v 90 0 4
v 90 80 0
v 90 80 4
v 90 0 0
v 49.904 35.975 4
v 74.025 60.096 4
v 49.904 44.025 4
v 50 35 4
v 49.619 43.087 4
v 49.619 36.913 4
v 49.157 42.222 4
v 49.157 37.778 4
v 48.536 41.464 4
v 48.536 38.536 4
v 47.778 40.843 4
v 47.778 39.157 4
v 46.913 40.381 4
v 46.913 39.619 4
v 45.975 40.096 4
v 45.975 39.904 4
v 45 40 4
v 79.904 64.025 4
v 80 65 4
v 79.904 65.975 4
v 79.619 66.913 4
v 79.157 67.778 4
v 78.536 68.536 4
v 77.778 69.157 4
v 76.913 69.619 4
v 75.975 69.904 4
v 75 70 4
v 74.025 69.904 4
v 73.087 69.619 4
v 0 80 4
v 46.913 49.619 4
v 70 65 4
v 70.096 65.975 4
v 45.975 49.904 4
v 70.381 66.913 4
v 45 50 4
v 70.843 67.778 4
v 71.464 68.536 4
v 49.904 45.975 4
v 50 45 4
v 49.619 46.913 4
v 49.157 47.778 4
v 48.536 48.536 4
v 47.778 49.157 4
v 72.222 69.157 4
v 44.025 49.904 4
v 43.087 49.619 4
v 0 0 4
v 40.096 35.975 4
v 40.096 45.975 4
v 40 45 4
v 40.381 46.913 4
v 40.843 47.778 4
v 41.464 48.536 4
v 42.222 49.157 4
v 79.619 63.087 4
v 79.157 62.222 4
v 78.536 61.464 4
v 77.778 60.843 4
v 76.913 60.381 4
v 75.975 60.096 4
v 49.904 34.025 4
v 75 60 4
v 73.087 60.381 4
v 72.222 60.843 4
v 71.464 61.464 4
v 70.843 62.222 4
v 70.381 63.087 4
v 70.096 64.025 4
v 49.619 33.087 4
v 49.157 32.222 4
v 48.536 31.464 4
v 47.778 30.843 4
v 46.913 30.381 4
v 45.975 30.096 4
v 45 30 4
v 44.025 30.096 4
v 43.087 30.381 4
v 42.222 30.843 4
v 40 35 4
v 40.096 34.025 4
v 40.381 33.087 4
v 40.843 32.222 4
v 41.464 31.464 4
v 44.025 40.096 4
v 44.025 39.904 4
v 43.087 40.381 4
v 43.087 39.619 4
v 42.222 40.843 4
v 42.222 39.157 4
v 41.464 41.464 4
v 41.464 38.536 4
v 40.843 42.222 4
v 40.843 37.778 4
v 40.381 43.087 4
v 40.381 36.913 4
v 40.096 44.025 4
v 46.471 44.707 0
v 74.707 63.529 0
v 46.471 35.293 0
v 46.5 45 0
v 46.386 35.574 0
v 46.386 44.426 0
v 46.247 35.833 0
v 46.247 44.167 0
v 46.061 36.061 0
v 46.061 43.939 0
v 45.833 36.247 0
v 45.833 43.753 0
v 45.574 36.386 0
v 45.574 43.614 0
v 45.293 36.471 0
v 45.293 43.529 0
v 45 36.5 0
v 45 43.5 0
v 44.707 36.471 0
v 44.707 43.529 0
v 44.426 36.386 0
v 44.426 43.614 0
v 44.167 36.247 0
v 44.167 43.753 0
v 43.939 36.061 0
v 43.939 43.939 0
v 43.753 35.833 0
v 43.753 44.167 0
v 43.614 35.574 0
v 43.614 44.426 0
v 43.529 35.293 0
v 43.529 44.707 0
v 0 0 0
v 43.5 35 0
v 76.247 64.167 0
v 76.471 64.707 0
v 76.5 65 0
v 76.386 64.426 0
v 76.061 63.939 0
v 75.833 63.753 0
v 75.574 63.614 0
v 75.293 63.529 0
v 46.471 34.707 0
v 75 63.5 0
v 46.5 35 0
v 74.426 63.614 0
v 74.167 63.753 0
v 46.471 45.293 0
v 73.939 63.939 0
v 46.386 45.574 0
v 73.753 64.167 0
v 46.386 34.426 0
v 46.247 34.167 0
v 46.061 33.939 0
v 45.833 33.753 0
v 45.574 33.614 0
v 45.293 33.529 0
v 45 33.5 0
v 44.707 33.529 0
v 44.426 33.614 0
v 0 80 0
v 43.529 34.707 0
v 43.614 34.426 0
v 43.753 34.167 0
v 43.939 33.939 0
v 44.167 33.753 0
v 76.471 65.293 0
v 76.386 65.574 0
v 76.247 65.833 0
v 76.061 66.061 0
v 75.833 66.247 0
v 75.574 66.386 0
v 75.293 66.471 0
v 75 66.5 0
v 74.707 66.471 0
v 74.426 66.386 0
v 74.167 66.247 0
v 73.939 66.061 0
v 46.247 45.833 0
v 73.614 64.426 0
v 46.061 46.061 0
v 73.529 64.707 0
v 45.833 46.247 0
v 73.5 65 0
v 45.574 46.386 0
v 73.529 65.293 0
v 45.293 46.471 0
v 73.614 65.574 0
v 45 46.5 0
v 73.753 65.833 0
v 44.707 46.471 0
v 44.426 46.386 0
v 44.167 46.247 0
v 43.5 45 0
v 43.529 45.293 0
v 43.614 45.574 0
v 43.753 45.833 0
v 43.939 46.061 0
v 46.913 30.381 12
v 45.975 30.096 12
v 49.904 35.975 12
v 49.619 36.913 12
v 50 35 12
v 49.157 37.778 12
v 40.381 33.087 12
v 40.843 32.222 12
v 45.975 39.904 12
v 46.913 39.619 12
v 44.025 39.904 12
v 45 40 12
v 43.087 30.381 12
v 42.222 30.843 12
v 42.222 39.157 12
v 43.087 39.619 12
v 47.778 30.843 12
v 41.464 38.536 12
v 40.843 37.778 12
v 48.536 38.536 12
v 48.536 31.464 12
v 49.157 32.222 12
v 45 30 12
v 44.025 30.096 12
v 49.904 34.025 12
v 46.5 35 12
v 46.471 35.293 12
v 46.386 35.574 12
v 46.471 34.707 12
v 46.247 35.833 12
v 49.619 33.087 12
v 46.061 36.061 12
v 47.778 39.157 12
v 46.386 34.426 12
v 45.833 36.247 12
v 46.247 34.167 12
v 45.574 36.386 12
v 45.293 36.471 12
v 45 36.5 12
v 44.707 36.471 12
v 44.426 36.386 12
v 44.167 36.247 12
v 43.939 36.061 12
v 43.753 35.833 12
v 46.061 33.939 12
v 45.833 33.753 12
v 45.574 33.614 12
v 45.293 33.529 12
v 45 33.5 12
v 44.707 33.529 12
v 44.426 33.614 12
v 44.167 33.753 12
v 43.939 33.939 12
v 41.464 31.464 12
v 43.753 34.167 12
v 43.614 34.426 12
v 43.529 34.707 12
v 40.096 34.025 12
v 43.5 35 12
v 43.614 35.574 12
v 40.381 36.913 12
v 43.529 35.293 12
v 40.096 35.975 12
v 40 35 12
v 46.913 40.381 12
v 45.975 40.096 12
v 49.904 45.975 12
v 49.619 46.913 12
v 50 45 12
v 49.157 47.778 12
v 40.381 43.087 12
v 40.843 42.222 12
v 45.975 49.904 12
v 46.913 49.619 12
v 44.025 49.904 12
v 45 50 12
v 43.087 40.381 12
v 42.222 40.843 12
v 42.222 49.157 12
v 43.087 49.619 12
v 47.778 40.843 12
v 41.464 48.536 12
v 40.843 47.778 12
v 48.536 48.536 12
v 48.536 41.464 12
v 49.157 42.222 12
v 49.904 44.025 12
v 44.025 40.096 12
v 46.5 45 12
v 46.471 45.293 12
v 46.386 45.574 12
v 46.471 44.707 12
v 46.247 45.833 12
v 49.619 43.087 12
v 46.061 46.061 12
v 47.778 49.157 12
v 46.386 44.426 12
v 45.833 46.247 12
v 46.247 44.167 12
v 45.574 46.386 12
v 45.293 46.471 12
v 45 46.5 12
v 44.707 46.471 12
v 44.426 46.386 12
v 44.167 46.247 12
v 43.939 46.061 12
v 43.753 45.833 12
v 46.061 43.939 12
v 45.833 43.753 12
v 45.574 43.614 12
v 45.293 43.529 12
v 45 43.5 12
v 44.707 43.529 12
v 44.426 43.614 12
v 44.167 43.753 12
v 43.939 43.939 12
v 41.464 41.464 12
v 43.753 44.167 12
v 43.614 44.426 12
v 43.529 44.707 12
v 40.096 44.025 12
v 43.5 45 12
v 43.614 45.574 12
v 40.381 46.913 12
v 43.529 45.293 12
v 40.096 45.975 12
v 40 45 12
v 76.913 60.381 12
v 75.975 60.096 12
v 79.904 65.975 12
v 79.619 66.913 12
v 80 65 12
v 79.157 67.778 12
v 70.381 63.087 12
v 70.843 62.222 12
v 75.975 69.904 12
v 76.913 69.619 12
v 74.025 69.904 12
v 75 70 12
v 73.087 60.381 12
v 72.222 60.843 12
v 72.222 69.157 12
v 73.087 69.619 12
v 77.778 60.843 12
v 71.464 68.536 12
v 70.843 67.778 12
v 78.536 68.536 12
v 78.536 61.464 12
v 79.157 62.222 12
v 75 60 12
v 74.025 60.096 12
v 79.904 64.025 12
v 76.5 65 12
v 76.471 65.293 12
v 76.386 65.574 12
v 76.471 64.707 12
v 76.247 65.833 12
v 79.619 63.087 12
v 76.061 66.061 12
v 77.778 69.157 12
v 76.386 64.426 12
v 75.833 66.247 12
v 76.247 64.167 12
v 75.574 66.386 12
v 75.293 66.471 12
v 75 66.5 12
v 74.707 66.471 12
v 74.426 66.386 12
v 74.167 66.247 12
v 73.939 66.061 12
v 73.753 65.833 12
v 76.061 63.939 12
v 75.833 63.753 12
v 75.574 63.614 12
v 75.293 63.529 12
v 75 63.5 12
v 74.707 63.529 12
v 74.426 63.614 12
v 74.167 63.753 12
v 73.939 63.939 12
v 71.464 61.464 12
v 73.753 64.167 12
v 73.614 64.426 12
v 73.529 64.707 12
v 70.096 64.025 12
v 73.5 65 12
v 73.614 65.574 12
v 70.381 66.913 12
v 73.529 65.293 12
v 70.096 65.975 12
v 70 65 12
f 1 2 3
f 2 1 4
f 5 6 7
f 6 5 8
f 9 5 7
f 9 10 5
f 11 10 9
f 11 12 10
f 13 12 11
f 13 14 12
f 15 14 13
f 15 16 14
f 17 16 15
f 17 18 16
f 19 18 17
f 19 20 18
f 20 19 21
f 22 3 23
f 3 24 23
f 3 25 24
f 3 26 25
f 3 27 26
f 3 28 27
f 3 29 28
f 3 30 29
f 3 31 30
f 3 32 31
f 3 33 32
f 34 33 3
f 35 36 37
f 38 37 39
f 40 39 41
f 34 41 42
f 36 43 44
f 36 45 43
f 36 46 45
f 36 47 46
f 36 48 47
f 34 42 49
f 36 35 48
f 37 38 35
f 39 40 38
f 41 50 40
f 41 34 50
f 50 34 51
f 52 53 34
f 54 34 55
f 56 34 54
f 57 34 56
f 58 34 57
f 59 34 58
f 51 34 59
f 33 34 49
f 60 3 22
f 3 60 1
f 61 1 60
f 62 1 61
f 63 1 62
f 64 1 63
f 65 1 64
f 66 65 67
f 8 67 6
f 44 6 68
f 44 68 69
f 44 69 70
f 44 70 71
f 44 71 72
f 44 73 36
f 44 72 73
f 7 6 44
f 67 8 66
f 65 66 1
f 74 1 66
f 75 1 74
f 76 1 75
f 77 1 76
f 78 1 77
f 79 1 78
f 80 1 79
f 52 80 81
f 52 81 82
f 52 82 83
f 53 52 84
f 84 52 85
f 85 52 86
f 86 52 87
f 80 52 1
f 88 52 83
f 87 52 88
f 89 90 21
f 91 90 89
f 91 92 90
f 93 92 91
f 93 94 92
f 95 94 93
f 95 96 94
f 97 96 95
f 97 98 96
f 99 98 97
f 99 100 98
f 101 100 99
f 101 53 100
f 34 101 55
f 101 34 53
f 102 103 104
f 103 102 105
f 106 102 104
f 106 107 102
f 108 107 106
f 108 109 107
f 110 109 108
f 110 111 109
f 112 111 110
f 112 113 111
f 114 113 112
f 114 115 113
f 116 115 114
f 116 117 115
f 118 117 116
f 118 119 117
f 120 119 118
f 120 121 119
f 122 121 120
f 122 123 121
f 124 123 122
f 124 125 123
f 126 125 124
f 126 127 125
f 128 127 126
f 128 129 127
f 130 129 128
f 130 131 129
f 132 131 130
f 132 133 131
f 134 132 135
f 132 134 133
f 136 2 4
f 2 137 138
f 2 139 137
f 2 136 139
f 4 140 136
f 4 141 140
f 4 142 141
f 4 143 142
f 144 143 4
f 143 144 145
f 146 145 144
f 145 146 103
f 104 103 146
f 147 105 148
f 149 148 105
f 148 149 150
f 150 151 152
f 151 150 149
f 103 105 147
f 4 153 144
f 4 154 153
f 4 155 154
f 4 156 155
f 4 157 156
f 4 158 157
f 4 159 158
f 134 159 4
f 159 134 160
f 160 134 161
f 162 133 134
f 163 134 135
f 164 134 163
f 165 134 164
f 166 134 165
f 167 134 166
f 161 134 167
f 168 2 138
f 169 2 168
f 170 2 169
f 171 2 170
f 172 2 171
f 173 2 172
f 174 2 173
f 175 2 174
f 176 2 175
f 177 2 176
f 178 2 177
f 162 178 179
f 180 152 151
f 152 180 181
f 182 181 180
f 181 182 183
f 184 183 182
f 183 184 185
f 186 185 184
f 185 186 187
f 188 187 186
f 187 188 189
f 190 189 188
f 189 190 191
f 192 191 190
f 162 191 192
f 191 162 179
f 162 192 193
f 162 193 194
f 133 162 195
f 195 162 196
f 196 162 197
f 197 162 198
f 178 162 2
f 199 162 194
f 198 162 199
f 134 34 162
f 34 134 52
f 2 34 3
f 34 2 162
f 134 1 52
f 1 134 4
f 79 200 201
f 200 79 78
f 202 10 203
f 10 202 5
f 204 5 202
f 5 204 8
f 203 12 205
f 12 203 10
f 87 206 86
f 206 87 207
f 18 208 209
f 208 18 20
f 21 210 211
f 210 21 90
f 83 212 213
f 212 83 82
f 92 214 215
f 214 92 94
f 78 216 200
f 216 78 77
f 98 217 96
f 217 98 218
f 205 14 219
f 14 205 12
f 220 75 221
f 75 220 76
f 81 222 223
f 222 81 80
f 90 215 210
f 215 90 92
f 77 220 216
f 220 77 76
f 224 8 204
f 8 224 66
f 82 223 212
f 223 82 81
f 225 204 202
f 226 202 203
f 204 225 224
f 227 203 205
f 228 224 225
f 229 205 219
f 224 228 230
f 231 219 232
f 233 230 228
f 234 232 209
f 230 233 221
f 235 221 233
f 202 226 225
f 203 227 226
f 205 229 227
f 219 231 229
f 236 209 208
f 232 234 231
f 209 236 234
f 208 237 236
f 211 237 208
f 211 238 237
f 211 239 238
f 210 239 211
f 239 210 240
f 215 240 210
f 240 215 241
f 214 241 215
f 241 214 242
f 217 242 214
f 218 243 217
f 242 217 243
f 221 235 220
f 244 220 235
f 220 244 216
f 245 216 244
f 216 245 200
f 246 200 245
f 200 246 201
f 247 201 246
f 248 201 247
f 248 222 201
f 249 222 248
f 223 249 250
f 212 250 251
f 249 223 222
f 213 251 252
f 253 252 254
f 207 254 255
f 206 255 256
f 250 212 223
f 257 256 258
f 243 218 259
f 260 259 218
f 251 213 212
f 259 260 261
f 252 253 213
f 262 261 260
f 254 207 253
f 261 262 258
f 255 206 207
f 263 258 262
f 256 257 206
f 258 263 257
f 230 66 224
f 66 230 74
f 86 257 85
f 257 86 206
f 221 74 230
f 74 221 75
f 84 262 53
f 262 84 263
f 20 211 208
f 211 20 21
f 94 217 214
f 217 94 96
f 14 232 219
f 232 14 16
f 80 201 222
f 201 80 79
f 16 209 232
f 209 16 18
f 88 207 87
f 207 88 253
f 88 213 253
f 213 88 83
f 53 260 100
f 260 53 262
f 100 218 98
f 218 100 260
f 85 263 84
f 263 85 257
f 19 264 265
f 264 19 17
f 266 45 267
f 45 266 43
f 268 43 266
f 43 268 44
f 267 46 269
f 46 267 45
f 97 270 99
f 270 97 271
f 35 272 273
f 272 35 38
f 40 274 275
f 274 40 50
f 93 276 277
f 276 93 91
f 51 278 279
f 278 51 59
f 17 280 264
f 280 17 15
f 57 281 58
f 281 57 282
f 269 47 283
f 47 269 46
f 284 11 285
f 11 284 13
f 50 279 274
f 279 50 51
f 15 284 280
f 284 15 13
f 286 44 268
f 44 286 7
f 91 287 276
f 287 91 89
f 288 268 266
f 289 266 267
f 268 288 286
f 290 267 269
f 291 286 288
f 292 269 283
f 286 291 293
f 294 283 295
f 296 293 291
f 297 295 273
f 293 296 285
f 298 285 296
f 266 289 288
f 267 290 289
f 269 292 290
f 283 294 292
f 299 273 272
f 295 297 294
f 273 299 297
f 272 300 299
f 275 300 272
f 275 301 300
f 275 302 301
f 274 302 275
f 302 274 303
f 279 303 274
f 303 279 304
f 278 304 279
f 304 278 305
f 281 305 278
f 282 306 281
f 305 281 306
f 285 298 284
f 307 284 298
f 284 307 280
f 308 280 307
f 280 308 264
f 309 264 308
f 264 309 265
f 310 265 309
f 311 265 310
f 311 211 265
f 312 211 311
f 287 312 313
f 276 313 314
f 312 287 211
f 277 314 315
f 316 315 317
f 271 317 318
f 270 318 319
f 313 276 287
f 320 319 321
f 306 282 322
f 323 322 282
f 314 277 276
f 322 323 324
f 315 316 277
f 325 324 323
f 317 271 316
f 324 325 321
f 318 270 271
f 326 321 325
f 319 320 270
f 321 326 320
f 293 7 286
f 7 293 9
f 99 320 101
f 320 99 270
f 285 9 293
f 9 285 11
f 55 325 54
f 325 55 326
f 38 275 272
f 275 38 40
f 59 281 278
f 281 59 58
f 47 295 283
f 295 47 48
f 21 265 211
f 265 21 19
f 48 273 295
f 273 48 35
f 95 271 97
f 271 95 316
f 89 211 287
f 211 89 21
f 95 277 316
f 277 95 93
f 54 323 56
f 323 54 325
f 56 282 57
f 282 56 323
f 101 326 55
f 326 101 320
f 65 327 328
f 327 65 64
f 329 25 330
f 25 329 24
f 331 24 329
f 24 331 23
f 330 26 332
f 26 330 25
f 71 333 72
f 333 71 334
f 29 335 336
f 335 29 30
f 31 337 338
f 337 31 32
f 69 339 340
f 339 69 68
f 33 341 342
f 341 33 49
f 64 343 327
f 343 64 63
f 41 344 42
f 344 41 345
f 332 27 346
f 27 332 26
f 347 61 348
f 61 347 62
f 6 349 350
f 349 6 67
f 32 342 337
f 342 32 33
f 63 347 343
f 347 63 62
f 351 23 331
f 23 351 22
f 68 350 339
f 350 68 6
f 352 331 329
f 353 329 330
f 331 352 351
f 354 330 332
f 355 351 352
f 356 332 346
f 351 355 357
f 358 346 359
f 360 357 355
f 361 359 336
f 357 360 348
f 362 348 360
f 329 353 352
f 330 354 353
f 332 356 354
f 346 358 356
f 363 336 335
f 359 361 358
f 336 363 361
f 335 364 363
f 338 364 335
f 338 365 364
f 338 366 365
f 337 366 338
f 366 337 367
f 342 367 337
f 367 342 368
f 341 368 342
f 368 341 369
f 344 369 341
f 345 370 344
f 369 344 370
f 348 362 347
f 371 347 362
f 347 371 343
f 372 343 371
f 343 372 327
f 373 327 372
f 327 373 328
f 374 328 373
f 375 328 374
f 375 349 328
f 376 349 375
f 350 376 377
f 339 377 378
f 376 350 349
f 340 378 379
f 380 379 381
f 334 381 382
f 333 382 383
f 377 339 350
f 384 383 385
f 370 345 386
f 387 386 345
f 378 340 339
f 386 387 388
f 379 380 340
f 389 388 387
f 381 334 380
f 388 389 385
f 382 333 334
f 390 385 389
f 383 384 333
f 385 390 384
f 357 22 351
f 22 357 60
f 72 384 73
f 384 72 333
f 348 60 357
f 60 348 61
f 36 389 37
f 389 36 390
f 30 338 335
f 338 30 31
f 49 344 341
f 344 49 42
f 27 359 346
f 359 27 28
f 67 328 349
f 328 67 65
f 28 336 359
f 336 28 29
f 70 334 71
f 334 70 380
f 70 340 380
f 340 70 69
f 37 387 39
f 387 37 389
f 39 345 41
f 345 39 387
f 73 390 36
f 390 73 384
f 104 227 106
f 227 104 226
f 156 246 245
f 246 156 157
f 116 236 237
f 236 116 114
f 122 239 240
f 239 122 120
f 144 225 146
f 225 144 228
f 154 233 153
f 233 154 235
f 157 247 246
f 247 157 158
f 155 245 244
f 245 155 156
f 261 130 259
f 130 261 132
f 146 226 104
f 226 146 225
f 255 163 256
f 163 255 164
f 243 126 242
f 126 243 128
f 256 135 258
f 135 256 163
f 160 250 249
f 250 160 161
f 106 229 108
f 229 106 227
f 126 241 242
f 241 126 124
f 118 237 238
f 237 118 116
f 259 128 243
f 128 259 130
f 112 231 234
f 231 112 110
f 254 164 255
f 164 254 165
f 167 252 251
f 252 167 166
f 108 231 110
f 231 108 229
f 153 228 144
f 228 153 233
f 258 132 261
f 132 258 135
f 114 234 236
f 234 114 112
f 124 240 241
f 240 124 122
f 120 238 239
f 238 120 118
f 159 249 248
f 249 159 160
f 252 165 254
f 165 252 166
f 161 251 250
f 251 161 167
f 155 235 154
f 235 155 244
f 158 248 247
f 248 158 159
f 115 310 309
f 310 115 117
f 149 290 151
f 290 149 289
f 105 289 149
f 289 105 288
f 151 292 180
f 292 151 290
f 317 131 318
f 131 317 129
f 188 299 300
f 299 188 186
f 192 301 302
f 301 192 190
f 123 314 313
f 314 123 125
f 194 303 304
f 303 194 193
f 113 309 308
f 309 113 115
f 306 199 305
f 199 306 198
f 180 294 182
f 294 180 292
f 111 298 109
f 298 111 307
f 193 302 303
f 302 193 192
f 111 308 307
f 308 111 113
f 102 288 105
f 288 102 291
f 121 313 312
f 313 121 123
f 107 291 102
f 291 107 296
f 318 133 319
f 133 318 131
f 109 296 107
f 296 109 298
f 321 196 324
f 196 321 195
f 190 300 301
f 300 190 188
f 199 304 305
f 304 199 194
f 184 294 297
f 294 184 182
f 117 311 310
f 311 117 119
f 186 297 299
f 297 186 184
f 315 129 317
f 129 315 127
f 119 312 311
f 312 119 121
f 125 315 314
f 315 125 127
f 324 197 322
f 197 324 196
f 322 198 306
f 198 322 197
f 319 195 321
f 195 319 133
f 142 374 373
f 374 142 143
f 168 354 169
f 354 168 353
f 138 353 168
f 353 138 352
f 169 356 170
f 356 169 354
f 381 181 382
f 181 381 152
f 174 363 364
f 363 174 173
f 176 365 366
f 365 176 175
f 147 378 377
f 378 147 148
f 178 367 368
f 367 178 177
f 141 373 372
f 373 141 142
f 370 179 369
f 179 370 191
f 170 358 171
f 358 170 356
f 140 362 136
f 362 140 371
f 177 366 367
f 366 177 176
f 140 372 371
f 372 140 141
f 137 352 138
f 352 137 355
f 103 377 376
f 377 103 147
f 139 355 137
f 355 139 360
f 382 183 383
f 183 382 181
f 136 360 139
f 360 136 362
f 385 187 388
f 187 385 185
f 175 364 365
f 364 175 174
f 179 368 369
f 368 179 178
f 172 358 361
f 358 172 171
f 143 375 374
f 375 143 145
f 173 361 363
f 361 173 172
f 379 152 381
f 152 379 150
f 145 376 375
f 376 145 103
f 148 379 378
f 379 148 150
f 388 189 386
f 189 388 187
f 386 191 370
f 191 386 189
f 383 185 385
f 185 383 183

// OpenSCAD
$fn = 32;

// ----------------------------------------------------------------------
// Boss field: plate with bosses at given coordinates
// ----------------------------------------------------------------------

// --- parameters (mm) ---
plate_l = 90;             // plate length, X
plate_w = 80;             // plate width, Y
plate_t = 4;              // plate thickness, Z
boss_d = 10;              // boss diameter
boss_h = 8;               // boss height above the plate
bore_d = 3;               // boss bore

total_h = plate_t + boss_h;  // overall height

difference() {
  union() {
    cube([plate_l, plate_w, plate_t]);
    translate([45, 35, plate_t]) cylinder(h = boss_h, d = boss_d);
    translate([45, 45, plate_t]) cylinder(h = boss_h, d = boss_d);
    translate([75, 65, plate_t]) cylinder(h = boss_h, d = boss_d);
  }
  translate([45, 35, -1]) cylinder(h = total_h + 2, d = bore_d);
  translate([45, 45, -1]) cylinder(h = total_h + 2, d = bore_d);
  translate([75, 65, -1]) cylinder(h = total_h + 2, d = bore_d);
}
